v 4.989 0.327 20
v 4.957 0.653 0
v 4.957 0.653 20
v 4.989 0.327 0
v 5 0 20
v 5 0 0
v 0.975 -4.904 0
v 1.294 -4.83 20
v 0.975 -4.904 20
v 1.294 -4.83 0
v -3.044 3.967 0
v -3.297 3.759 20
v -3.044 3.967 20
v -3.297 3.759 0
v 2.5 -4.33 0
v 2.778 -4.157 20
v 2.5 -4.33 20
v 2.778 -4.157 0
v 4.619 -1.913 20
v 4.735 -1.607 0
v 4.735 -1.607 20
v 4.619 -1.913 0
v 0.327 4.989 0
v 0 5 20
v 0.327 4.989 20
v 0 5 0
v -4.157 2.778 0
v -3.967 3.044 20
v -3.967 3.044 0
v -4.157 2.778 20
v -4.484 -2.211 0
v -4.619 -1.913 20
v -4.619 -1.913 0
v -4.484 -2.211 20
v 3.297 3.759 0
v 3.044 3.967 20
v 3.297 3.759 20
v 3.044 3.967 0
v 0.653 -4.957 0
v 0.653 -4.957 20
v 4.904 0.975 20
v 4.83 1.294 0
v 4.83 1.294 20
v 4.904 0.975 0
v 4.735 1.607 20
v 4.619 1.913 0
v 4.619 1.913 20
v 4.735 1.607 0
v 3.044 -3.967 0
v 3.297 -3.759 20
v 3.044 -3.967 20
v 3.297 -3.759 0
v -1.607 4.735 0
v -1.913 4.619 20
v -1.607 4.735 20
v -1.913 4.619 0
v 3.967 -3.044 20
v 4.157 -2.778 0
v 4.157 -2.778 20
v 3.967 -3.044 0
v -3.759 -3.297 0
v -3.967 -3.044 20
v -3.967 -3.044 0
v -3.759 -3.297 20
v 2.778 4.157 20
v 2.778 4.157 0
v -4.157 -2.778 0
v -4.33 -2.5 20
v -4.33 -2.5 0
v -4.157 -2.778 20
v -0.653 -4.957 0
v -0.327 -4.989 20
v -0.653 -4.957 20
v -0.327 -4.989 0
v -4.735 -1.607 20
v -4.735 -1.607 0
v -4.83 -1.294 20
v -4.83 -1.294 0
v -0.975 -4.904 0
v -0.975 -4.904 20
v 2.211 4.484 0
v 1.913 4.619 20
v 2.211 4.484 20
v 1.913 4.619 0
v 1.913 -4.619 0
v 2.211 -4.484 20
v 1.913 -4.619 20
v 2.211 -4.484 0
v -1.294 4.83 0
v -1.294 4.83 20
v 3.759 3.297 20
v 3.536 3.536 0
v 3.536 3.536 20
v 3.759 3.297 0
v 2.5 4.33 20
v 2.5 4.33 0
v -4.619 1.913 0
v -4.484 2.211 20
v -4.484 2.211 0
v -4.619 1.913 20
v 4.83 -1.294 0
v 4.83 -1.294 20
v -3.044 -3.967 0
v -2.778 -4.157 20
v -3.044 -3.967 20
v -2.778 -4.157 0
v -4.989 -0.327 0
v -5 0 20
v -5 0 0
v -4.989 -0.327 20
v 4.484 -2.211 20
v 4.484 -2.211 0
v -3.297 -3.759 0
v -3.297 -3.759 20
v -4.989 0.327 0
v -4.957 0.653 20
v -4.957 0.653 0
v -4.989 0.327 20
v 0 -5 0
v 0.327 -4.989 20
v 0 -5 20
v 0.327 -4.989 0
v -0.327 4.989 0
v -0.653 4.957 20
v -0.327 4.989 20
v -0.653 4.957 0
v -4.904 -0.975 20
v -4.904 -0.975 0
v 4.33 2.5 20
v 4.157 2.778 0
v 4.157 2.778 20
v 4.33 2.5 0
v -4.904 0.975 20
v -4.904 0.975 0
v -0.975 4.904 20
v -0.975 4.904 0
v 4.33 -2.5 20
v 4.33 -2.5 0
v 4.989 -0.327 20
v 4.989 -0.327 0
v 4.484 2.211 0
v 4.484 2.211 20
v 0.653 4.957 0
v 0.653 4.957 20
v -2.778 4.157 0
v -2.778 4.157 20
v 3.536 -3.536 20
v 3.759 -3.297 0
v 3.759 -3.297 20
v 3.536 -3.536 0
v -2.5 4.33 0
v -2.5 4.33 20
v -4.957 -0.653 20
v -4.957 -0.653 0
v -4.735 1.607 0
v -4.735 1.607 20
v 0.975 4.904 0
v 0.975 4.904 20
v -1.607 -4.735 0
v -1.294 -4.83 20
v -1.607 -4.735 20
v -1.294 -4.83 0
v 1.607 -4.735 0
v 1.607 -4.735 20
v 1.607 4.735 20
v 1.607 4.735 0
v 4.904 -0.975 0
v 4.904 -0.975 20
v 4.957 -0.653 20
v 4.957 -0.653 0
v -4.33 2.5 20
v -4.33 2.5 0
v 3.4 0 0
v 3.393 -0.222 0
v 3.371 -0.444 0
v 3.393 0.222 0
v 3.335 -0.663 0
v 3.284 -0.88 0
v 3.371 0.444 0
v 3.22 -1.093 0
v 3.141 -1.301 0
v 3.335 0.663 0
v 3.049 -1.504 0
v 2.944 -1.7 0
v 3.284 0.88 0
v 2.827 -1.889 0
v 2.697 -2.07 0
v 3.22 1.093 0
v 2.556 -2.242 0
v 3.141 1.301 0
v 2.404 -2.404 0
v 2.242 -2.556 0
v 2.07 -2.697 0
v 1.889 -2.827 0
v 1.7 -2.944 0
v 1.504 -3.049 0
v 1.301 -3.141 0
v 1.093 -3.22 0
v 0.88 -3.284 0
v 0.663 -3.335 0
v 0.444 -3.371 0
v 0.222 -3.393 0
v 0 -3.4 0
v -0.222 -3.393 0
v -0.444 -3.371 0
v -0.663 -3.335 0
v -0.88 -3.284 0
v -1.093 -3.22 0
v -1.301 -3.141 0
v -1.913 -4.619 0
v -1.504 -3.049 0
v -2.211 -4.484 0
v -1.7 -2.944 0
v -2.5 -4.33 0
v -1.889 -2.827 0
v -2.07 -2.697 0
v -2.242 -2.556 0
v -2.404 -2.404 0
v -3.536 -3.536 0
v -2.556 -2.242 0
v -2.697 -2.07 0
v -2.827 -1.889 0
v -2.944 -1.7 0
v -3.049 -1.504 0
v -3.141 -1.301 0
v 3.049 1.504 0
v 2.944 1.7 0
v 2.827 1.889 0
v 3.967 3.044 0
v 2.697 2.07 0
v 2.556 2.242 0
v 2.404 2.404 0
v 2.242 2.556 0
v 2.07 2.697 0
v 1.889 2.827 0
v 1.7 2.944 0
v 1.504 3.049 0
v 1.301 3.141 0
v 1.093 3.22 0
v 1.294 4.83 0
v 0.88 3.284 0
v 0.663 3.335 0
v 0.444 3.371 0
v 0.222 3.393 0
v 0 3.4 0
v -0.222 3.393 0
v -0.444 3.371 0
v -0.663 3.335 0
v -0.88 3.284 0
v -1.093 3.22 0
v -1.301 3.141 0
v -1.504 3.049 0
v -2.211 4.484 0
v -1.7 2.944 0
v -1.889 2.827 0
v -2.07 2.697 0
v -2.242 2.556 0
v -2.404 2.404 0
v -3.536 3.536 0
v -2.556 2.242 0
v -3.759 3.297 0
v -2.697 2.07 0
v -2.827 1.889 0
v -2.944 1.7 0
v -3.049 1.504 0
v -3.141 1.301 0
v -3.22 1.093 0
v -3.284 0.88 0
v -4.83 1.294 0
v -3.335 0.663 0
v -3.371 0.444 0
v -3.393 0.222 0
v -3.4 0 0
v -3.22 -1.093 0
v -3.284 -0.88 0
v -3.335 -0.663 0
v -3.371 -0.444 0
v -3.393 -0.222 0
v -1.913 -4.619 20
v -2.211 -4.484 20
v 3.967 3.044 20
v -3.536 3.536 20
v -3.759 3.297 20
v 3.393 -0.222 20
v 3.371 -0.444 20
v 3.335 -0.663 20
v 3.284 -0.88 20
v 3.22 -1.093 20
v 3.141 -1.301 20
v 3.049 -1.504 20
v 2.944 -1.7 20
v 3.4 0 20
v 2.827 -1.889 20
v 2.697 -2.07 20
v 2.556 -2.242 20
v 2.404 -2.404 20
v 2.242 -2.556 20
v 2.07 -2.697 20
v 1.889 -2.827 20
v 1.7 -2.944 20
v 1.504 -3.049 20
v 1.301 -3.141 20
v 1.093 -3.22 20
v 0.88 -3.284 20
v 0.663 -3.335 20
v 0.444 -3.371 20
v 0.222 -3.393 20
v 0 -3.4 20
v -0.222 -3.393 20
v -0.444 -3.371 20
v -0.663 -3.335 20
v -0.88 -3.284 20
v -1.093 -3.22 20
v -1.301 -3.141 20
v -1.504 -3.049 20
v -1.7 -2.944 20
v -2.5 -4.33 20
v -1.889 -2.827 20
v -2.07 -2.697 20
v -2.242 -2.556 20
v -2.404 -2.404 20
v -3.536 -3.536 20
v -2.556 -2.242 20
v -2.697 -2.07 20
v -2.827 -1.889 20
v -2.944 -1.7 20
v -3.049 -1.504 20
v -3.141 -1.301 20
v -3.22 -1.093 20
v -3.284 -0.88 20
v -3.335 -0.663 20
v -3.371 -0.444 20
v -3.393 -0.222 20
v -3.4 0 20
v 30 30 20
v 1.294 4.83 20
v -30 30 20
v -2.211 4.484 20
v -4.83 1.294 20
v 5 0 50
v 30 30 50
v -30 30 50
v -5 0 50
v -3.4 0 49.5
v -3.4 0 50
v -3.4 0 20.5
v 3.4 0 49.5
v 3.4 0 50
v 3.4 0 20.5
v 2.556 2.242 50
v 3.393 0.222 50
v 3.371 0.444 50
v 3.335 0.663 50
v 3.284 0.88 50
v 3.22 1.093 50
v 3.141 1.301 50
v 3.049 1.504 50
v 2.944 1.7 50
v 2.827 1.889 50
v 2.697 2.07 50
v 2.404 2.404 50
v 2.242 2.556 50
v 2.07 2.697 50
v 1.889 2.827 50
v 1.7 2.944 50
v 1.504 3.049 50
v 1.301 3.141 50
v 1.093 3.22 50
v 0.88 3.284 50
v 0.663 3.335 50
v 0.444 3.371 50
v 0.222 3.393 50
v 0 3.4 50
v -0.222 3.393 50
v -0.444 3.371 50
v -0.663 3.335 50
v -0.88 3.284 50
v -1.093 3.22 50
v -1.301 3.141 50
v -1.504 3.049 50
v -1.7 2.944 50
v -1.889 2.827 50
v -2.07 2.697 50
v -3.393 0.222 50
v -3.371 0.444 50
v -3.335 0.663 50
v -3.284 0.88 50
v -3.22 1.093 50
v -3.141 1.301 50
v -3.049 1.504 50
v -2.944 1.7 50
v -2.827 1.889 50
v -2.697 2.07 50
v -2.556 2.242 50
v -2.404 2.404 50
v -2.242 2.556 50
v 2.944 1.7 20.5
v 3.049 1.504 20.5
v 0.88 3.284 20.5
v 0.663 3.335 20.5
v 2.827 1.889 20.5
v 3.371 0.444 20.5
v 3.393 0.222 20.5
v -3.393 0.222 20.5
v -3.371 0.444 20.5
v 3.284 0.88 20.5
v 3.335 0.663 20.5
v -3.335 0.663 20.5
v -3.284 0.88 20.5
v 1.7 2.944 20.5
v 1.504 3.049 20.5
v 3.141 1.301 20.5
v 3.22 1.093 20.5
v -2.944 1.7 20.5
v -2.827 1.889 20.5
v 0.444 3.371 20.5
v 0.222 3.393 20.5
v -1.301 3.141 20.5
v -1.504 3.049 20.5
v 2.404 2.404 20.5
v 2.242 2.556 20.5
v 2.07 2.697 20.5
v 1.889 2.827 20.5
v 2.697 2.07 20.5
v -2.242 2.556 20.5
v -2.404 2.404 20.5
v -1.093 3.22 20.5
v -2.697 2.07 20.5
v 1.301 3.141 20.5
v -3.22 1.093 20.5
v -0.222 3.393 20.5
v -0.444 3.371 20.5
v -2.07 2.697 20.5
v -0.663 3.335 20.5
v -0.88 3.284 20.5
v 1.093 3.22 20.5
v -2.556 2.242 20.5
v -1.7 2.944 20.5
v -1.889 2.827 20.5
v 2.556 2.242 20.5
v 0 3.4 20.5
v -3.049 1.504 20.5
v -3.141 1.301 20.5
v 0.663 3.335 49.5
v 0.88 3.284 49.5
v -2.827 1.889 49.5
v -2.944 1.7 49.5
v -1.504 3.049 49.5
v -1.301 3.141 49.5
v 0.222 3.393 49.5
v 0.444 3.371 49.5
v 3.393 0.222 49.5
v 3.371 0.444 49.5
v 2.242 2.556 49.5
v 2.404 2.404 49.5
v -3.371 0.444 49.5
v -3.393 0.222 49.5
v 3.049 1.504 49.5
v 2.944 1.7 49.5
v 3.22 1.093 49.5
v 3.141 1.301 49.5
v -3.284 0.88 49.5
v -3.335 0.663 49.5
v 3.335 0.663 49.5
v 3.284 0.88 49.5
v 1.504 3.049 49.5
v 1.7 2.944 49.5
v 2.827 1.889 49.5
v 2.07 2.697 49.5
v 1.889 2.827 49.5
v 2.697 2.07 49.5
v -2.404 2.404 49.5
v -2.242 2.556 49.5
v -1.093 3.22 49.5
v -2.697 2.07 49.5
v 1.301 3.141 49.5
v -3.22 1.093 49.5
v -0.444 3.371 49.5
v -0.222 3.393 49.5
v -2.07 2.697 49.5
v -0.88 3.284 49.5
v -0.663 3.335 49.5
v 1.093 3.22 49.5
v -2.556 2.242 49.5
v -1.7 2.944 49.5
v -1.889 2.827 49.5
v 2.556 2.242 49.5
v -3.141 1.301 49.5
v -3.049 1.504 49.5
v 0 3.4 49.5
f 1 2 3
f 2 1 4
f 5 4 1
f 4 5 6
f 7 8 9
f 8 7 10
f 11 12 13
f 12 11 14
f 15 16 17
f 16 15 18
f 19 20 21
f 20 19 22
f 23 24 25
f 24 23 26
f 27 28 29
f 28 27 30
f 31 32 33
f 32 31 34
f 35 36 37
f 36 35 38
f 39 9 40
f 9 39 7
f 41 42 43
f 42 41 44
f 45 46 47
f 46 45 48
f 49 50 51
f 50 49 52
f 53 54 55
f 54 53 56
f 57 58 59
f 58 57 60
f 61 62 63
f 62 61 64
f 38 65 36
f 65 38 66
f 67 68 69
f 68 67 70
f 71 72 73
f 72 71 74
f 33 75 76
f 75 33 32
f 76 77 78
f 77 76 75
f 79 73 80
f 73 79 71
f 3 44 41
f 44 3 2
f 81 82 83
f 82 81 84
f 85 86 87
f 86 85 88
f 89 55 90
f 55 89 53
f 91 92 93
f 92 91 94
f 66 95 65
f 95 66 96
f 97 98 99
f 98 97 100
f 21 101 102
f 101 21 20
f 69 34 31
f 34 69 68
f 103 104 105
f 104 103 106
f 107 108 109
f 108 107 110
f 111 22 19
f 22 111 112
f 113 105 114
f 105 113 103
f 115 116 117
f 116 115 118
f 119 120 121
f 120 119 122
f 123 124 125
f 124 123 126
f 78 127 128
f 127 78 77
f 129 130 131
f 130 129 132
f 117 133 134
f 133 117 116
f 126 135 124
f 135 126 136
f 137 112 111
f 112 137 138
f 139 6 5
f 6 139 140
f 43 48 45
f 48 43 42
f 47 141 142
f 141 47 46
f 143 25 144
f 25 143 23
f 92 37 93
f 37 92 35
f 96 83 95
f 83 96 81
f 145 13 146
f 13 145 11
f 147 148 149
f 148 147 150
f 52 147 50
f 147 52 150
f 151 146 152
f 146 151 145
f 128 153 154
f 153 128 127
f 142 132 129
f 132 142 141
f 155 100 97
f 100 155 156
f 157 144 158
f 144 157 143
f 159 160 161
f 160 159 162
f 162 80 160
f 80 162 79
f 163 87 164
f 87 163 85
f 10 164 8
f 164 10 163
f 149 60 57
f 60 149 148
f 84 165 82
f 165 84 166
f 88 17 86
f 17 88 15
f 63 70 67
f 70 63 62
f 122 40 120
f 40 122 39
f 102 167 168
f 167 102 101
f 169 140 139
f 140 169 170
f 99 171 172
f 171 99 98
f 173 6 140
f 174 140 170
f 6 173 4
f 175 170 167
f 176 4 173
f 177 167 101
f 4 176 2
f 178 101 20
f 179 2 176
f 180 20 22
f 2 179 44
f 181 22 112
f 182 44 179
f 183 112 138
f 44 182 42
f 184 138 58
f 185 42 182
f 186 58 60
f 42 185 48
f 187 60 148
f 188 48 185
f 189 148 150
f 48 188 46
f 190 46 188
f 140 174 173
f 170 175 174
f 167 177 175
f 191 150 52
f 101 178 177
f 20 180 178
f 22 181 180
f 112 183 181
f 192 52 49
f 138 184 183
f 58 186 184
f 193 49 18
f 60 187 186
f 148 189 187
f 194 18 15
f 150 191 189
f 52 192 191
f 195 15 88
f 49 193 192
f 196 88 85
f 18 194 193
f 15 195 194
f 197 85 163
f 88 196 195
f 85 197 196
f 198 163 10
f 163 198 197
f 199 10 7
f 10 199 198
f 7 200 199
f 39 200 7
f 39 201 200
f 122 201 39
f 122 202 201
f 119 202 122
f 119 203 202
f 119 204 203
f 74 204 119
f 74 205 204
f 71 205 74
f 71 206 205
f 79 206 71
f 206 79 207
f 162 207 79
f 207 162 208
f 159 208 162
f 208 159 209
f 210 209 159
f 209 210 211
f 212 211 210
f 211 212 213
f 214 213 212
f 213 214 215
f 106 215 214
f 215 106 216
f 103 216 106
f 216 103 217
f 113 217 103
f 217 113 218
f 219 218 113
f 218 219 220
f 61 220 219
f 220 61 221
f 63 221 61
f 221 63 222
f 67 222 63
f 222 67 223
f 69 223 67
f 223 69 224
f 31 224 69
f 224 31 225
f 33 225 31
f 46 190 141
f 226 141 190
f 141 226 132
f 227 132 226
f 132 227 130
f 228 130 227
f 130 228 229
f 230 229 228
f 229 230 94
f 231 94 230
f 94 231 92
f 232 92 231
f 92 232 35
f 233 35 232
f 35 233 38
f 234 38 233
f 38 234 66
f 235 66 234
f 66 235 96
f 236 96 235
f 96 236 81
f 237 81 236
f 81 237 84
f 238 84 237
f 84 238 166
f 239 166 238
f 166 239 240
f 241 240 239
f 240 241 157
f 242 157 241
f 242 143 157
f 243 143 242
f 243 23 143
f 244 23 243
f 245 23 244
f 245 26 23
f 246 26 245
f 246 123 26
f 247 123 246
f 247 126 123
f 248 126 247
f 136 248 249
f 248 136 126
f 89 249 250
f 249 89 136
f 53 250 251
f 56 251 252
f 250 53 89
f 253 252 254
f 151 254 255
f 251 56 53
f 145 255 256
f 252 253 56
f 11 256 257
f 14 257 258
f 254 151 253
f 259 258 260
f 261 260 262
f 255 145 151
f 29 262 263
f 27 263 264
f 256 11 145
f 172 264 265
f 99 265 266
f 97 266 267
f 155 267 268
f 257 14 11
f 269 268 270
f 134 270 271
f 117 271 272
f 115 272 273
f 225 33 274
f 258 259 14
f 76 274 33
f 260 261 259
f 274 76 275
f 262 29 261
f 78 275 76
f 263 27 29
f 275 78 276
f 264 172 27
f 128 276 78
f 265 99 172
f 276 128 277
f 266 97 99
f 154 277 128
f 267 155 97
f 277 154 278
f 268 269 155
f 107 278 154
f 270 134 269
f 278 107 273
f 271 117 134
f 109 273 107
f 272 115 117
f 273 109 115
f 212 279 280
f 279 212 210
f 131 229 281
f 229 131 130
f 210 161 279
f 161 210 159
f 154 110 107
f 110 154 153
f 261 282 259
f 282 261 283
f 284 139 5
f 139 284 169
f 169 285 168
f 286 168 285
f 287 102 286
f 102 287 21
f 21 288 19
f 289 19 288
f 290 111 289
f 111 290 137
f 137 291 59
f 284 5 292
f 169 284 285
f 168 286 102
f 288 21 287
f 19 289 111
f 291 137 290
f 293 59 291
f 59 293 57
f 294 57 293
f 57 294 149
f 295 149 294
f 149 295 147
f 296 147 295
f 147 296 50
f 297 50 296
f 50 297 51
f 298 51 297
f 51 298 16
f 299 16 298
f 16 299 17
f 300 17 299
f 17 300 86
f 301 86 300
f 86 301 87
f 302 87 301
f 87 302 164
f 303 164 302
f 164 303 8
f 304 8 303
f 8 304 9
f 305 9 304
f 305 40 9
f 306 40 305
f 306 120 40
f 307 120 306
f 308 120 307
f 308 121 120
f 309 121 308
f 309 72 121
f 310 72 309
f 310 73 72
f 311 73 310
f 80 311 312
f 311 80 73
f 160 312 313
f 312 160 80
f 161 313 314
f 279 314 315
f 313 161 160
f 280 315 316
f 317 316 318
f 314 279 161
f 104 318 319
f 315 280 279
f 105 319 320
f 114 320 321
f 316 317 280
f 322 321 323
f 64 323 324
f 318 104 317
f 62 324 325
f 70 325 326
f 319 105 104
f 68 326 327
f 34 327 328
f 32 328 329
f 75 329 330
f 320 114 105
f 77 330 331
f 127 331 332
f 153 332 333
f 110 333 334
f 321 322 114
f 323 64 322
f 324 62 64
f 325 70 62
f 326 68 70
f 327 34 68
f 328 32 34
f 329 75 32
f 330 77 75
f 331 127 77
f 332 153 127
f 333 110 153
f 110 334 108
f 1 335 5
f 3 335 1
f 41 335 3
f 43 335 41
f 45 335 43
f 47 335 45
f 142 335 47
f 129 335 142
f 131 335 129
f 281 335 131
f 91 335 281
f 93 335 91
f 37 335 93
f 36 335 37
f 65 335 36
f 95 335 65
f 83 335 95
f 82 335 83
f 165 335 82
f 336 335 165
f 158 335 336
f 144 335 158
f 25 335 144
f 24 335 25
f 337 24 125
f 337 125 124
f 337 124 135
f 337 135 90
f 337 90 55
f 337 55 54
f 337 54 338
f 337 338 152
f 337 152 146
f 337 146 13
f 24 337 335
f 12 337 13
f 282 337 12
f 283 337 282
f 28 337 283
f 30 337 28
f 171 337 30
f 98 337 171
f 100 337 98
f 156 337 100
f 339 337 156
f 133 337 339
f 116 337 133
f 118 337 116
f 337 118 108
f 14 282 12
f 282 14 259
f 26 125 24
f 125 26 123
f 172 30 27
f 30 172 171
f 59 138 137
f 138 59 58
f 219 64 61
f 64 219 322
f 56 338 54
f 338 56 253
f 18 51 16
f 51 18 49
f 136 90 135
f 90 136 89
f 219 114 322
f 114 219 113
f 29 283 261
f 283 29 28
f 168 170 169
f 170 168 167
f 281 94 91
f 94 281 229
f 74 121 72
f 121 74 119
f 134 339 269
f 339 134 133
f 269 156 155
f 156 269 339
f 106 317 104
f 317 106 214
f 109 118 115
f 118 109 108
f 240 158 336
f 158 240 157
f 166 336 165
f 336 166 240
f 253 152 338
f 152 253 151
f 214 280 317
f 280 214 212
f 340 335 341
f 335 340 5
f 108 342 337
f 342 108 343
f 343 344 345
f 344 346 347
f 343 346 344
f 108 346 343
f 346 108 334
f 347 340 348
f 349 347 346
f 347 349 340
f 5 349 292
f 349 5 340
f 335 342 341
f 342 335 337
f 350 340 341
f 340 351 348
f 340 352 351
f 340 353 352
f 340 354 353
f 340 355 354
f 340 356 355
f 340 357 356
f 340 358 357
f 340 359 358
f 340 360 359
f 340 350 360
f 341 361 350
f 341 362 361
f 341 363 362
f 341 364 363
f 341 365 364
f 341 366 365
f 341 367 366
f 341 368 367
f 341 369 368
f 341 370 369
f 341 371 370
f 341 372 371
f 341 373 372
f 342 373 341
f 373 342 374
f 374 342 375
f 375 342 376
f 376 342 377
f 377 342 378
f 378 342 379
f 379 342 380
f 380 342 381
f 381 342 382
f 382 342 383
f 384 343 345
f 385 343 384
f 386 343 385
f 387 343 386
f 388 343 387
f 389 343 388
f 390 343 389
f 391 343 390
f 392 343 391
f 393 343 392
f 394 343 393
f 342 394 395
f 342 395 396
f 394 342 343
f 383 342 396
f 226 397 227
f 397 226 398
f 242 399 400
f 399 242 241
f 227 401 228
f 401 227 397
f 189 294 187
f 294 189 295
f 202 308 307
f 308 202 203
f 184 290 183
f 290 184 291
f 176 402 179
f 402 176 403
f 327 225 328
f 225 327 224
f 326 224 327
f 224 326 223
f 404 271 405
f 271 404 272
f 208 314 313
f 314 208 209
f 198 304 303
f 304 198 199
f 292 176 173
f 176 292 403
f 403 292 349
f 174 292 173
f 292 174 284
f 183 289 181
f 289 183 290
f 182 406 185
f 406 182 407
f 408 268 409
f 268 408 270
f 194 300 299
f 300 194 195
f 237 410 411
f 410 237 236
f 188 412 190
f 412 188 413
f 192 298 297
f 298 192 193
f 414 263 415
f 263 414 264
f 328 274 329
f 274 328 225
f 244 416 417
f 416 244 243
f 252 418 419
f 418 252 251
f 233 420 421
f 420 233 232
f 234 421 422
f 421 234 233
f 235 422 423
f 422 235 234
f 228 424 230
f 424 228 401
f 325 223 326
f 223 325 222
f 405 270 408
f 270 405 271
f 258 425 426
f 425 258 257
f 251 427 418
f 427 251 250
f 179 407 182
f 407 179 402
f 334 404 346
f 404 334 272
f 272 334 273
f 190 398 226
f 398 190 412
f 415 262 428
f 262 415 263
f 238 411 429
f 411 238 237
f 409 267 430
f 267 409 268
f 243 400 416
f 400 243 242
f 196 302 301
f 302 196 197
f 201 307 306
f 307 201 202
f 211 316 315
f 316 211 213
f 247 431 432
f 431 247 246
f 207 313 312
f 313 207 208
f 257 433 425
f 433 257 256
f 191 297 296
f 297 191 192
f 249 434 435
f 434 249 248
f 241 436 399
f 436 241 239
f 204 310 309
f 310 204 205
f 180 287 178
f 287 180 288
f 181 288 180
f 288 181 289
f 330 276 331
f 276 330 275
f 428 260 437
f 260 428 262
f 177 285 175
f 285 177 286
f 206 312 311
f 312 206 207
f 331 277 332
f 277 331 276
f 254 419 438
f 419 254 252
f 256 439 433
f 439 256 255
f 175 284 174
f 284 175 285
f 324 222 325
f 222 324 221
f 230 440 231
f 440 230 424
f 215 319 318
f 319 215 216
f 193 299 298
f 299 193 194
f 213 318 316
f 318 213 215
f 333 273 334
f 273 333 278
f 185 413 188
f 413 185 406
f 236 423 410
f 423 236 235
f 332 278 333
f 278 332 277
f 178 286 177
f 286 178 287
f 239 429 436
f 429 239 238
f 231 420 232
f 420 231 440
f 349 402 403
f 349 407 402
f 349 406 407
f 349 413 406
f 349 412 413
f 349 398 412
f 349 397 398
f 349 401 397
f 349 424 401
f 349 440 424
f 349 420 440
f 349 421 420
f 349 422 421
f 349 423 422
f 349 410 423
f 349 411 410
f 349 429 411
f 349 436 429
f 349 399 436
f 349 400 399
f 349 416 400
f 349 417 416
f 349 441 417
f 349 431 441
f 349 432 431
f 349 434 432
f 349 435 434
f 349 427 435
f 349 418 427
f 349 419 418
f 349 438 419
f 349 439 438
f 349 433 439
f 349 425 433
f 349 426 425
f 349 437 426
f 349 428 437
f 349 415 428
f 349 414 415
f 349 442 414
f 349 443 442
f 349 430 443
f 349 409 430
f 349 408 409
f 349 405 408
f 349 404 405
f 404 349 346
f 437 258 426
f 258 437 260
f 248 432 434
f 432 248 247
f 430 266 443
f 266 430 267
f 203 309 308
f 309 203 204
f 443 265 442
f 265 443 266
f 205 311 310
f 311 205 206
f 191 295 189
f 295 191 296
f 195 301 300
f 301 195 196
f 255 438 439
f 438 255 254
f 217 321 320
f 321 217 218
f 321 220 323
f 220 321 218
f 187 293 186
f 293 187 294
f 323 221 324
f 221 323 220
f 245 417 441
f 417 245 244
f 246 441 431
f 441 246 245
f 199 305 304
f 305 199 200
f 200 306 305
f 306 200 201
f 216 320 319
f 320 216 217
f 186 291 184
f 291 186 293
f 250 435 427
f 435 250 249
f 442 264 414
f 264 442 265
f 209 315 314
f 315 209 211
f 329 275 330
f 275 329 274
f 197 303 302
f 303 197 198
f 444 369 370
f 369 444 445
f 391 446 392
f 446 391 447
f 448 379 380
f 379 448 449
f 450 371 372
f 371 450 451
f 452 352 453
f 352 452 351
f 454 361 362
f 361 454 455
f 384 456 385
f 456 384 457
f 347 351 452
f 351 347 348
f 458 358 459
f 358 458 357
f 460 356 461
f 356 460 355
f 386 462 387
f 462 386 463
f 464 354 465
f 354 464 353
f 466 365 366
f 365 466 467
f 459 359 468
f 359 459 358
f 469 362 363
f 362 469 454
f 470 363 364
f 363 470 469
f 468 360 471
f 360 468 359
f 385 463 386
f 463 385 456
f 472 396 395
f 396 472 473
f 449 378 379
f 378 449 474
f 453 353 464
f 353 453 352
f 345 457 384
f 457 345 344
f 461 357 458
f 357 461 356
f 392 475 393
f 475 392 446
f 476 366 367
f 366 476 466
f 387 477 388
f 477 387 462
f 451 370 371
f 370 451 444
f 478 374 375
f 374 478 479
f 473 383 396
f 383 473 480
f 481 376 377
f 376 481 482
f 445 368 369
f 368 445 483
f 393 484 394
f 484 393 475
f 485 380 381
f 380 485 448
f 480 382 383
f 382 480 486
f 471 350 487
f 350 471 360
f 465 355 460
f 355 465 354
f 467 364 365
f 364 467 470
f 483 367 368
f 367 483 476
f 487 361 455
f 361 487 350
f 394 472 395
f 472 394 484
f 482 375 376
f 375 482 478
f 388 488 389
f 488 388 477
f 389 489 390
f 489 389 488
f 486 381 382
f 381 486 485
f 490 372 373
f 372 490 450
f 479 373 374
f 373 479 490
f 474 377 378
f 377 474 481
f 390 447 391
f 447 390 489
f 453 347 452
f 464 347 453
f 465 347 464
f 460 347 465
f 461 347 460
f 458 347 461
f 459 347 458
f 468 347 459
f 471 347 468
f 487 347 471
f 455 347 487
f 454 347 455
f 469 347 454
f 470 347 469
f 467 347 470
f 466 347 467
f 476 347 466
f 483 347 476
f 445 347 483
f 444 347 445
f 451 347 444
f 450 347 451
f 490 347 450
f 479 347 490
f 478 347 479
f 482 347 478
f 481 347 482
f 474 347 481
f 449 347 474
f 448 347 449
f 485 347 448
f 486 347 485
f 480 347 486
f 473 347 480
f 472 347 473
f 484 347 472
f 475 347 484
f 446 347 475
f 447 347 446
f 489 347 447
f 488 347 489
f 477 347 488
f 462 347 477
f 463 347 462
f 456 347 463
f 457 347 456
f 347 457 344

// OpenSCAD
// Lab funnel - printed upright, open top and bottom
// Spout: 10 mm outer diameter, z = 0 to 20
// Cone: widens from 10 mm (z = 20) to 60 mm (z = 50)
// Wall: 1.6 mm everywhere

// ---------- Parameters ----------
spout_d        = 10;     // spout outer diameter
spout_h        = 20;     // spout height
cone_d_top     = 60;     // cone rim outer diameter
cone_d_bottom  = 10;     // cone base outer diameter (at z = spout_h)
cone_h         = 30;     // cone height (z = 20 to z = 50)
wall           = 1.6;    // wall thickness
eps            = 0.5;    // cutter overshoot past faces

$fn = 96;

// Bore diameter of spout and cone
bore = spout_d - 2 * wall;

// ---------- Model ----------
difference() {
    union() {
        // Spout: cylinder from z = 0 to z = 20
        translate([0, 0, 0])
            cylinder(d = spout_d, h = spout_h);

        // Cone: linear_extrude of a trapezoid (10 mm to 60 mm) over 30 mm
        translate([0, 0, spout_h])
            linear_extrude(height = cone_h)
                polygon([[-cone_d_bottom / 2, 0],
                        [ cone_d_bottom / 2, 0],
                        [ cone_d_top    / 2, cone_h],
                        [-cone_d_top    / 2, cone_h]]);
    }

    // Bottom cutter: cylinder through z = 0 to z = -eps
    translate([0, 0, -eps])
        cylinder(d = bore, h = spout_h + 2 * eps);

    // Top cutter: cylinder through z = spout_h + cone_h to z = spout_h + cone_h + eps
    translate([0, 0, spout_h + cone_h - eps])
        cylinder(d = bore, h = cone_h + 2 * eps);
}
